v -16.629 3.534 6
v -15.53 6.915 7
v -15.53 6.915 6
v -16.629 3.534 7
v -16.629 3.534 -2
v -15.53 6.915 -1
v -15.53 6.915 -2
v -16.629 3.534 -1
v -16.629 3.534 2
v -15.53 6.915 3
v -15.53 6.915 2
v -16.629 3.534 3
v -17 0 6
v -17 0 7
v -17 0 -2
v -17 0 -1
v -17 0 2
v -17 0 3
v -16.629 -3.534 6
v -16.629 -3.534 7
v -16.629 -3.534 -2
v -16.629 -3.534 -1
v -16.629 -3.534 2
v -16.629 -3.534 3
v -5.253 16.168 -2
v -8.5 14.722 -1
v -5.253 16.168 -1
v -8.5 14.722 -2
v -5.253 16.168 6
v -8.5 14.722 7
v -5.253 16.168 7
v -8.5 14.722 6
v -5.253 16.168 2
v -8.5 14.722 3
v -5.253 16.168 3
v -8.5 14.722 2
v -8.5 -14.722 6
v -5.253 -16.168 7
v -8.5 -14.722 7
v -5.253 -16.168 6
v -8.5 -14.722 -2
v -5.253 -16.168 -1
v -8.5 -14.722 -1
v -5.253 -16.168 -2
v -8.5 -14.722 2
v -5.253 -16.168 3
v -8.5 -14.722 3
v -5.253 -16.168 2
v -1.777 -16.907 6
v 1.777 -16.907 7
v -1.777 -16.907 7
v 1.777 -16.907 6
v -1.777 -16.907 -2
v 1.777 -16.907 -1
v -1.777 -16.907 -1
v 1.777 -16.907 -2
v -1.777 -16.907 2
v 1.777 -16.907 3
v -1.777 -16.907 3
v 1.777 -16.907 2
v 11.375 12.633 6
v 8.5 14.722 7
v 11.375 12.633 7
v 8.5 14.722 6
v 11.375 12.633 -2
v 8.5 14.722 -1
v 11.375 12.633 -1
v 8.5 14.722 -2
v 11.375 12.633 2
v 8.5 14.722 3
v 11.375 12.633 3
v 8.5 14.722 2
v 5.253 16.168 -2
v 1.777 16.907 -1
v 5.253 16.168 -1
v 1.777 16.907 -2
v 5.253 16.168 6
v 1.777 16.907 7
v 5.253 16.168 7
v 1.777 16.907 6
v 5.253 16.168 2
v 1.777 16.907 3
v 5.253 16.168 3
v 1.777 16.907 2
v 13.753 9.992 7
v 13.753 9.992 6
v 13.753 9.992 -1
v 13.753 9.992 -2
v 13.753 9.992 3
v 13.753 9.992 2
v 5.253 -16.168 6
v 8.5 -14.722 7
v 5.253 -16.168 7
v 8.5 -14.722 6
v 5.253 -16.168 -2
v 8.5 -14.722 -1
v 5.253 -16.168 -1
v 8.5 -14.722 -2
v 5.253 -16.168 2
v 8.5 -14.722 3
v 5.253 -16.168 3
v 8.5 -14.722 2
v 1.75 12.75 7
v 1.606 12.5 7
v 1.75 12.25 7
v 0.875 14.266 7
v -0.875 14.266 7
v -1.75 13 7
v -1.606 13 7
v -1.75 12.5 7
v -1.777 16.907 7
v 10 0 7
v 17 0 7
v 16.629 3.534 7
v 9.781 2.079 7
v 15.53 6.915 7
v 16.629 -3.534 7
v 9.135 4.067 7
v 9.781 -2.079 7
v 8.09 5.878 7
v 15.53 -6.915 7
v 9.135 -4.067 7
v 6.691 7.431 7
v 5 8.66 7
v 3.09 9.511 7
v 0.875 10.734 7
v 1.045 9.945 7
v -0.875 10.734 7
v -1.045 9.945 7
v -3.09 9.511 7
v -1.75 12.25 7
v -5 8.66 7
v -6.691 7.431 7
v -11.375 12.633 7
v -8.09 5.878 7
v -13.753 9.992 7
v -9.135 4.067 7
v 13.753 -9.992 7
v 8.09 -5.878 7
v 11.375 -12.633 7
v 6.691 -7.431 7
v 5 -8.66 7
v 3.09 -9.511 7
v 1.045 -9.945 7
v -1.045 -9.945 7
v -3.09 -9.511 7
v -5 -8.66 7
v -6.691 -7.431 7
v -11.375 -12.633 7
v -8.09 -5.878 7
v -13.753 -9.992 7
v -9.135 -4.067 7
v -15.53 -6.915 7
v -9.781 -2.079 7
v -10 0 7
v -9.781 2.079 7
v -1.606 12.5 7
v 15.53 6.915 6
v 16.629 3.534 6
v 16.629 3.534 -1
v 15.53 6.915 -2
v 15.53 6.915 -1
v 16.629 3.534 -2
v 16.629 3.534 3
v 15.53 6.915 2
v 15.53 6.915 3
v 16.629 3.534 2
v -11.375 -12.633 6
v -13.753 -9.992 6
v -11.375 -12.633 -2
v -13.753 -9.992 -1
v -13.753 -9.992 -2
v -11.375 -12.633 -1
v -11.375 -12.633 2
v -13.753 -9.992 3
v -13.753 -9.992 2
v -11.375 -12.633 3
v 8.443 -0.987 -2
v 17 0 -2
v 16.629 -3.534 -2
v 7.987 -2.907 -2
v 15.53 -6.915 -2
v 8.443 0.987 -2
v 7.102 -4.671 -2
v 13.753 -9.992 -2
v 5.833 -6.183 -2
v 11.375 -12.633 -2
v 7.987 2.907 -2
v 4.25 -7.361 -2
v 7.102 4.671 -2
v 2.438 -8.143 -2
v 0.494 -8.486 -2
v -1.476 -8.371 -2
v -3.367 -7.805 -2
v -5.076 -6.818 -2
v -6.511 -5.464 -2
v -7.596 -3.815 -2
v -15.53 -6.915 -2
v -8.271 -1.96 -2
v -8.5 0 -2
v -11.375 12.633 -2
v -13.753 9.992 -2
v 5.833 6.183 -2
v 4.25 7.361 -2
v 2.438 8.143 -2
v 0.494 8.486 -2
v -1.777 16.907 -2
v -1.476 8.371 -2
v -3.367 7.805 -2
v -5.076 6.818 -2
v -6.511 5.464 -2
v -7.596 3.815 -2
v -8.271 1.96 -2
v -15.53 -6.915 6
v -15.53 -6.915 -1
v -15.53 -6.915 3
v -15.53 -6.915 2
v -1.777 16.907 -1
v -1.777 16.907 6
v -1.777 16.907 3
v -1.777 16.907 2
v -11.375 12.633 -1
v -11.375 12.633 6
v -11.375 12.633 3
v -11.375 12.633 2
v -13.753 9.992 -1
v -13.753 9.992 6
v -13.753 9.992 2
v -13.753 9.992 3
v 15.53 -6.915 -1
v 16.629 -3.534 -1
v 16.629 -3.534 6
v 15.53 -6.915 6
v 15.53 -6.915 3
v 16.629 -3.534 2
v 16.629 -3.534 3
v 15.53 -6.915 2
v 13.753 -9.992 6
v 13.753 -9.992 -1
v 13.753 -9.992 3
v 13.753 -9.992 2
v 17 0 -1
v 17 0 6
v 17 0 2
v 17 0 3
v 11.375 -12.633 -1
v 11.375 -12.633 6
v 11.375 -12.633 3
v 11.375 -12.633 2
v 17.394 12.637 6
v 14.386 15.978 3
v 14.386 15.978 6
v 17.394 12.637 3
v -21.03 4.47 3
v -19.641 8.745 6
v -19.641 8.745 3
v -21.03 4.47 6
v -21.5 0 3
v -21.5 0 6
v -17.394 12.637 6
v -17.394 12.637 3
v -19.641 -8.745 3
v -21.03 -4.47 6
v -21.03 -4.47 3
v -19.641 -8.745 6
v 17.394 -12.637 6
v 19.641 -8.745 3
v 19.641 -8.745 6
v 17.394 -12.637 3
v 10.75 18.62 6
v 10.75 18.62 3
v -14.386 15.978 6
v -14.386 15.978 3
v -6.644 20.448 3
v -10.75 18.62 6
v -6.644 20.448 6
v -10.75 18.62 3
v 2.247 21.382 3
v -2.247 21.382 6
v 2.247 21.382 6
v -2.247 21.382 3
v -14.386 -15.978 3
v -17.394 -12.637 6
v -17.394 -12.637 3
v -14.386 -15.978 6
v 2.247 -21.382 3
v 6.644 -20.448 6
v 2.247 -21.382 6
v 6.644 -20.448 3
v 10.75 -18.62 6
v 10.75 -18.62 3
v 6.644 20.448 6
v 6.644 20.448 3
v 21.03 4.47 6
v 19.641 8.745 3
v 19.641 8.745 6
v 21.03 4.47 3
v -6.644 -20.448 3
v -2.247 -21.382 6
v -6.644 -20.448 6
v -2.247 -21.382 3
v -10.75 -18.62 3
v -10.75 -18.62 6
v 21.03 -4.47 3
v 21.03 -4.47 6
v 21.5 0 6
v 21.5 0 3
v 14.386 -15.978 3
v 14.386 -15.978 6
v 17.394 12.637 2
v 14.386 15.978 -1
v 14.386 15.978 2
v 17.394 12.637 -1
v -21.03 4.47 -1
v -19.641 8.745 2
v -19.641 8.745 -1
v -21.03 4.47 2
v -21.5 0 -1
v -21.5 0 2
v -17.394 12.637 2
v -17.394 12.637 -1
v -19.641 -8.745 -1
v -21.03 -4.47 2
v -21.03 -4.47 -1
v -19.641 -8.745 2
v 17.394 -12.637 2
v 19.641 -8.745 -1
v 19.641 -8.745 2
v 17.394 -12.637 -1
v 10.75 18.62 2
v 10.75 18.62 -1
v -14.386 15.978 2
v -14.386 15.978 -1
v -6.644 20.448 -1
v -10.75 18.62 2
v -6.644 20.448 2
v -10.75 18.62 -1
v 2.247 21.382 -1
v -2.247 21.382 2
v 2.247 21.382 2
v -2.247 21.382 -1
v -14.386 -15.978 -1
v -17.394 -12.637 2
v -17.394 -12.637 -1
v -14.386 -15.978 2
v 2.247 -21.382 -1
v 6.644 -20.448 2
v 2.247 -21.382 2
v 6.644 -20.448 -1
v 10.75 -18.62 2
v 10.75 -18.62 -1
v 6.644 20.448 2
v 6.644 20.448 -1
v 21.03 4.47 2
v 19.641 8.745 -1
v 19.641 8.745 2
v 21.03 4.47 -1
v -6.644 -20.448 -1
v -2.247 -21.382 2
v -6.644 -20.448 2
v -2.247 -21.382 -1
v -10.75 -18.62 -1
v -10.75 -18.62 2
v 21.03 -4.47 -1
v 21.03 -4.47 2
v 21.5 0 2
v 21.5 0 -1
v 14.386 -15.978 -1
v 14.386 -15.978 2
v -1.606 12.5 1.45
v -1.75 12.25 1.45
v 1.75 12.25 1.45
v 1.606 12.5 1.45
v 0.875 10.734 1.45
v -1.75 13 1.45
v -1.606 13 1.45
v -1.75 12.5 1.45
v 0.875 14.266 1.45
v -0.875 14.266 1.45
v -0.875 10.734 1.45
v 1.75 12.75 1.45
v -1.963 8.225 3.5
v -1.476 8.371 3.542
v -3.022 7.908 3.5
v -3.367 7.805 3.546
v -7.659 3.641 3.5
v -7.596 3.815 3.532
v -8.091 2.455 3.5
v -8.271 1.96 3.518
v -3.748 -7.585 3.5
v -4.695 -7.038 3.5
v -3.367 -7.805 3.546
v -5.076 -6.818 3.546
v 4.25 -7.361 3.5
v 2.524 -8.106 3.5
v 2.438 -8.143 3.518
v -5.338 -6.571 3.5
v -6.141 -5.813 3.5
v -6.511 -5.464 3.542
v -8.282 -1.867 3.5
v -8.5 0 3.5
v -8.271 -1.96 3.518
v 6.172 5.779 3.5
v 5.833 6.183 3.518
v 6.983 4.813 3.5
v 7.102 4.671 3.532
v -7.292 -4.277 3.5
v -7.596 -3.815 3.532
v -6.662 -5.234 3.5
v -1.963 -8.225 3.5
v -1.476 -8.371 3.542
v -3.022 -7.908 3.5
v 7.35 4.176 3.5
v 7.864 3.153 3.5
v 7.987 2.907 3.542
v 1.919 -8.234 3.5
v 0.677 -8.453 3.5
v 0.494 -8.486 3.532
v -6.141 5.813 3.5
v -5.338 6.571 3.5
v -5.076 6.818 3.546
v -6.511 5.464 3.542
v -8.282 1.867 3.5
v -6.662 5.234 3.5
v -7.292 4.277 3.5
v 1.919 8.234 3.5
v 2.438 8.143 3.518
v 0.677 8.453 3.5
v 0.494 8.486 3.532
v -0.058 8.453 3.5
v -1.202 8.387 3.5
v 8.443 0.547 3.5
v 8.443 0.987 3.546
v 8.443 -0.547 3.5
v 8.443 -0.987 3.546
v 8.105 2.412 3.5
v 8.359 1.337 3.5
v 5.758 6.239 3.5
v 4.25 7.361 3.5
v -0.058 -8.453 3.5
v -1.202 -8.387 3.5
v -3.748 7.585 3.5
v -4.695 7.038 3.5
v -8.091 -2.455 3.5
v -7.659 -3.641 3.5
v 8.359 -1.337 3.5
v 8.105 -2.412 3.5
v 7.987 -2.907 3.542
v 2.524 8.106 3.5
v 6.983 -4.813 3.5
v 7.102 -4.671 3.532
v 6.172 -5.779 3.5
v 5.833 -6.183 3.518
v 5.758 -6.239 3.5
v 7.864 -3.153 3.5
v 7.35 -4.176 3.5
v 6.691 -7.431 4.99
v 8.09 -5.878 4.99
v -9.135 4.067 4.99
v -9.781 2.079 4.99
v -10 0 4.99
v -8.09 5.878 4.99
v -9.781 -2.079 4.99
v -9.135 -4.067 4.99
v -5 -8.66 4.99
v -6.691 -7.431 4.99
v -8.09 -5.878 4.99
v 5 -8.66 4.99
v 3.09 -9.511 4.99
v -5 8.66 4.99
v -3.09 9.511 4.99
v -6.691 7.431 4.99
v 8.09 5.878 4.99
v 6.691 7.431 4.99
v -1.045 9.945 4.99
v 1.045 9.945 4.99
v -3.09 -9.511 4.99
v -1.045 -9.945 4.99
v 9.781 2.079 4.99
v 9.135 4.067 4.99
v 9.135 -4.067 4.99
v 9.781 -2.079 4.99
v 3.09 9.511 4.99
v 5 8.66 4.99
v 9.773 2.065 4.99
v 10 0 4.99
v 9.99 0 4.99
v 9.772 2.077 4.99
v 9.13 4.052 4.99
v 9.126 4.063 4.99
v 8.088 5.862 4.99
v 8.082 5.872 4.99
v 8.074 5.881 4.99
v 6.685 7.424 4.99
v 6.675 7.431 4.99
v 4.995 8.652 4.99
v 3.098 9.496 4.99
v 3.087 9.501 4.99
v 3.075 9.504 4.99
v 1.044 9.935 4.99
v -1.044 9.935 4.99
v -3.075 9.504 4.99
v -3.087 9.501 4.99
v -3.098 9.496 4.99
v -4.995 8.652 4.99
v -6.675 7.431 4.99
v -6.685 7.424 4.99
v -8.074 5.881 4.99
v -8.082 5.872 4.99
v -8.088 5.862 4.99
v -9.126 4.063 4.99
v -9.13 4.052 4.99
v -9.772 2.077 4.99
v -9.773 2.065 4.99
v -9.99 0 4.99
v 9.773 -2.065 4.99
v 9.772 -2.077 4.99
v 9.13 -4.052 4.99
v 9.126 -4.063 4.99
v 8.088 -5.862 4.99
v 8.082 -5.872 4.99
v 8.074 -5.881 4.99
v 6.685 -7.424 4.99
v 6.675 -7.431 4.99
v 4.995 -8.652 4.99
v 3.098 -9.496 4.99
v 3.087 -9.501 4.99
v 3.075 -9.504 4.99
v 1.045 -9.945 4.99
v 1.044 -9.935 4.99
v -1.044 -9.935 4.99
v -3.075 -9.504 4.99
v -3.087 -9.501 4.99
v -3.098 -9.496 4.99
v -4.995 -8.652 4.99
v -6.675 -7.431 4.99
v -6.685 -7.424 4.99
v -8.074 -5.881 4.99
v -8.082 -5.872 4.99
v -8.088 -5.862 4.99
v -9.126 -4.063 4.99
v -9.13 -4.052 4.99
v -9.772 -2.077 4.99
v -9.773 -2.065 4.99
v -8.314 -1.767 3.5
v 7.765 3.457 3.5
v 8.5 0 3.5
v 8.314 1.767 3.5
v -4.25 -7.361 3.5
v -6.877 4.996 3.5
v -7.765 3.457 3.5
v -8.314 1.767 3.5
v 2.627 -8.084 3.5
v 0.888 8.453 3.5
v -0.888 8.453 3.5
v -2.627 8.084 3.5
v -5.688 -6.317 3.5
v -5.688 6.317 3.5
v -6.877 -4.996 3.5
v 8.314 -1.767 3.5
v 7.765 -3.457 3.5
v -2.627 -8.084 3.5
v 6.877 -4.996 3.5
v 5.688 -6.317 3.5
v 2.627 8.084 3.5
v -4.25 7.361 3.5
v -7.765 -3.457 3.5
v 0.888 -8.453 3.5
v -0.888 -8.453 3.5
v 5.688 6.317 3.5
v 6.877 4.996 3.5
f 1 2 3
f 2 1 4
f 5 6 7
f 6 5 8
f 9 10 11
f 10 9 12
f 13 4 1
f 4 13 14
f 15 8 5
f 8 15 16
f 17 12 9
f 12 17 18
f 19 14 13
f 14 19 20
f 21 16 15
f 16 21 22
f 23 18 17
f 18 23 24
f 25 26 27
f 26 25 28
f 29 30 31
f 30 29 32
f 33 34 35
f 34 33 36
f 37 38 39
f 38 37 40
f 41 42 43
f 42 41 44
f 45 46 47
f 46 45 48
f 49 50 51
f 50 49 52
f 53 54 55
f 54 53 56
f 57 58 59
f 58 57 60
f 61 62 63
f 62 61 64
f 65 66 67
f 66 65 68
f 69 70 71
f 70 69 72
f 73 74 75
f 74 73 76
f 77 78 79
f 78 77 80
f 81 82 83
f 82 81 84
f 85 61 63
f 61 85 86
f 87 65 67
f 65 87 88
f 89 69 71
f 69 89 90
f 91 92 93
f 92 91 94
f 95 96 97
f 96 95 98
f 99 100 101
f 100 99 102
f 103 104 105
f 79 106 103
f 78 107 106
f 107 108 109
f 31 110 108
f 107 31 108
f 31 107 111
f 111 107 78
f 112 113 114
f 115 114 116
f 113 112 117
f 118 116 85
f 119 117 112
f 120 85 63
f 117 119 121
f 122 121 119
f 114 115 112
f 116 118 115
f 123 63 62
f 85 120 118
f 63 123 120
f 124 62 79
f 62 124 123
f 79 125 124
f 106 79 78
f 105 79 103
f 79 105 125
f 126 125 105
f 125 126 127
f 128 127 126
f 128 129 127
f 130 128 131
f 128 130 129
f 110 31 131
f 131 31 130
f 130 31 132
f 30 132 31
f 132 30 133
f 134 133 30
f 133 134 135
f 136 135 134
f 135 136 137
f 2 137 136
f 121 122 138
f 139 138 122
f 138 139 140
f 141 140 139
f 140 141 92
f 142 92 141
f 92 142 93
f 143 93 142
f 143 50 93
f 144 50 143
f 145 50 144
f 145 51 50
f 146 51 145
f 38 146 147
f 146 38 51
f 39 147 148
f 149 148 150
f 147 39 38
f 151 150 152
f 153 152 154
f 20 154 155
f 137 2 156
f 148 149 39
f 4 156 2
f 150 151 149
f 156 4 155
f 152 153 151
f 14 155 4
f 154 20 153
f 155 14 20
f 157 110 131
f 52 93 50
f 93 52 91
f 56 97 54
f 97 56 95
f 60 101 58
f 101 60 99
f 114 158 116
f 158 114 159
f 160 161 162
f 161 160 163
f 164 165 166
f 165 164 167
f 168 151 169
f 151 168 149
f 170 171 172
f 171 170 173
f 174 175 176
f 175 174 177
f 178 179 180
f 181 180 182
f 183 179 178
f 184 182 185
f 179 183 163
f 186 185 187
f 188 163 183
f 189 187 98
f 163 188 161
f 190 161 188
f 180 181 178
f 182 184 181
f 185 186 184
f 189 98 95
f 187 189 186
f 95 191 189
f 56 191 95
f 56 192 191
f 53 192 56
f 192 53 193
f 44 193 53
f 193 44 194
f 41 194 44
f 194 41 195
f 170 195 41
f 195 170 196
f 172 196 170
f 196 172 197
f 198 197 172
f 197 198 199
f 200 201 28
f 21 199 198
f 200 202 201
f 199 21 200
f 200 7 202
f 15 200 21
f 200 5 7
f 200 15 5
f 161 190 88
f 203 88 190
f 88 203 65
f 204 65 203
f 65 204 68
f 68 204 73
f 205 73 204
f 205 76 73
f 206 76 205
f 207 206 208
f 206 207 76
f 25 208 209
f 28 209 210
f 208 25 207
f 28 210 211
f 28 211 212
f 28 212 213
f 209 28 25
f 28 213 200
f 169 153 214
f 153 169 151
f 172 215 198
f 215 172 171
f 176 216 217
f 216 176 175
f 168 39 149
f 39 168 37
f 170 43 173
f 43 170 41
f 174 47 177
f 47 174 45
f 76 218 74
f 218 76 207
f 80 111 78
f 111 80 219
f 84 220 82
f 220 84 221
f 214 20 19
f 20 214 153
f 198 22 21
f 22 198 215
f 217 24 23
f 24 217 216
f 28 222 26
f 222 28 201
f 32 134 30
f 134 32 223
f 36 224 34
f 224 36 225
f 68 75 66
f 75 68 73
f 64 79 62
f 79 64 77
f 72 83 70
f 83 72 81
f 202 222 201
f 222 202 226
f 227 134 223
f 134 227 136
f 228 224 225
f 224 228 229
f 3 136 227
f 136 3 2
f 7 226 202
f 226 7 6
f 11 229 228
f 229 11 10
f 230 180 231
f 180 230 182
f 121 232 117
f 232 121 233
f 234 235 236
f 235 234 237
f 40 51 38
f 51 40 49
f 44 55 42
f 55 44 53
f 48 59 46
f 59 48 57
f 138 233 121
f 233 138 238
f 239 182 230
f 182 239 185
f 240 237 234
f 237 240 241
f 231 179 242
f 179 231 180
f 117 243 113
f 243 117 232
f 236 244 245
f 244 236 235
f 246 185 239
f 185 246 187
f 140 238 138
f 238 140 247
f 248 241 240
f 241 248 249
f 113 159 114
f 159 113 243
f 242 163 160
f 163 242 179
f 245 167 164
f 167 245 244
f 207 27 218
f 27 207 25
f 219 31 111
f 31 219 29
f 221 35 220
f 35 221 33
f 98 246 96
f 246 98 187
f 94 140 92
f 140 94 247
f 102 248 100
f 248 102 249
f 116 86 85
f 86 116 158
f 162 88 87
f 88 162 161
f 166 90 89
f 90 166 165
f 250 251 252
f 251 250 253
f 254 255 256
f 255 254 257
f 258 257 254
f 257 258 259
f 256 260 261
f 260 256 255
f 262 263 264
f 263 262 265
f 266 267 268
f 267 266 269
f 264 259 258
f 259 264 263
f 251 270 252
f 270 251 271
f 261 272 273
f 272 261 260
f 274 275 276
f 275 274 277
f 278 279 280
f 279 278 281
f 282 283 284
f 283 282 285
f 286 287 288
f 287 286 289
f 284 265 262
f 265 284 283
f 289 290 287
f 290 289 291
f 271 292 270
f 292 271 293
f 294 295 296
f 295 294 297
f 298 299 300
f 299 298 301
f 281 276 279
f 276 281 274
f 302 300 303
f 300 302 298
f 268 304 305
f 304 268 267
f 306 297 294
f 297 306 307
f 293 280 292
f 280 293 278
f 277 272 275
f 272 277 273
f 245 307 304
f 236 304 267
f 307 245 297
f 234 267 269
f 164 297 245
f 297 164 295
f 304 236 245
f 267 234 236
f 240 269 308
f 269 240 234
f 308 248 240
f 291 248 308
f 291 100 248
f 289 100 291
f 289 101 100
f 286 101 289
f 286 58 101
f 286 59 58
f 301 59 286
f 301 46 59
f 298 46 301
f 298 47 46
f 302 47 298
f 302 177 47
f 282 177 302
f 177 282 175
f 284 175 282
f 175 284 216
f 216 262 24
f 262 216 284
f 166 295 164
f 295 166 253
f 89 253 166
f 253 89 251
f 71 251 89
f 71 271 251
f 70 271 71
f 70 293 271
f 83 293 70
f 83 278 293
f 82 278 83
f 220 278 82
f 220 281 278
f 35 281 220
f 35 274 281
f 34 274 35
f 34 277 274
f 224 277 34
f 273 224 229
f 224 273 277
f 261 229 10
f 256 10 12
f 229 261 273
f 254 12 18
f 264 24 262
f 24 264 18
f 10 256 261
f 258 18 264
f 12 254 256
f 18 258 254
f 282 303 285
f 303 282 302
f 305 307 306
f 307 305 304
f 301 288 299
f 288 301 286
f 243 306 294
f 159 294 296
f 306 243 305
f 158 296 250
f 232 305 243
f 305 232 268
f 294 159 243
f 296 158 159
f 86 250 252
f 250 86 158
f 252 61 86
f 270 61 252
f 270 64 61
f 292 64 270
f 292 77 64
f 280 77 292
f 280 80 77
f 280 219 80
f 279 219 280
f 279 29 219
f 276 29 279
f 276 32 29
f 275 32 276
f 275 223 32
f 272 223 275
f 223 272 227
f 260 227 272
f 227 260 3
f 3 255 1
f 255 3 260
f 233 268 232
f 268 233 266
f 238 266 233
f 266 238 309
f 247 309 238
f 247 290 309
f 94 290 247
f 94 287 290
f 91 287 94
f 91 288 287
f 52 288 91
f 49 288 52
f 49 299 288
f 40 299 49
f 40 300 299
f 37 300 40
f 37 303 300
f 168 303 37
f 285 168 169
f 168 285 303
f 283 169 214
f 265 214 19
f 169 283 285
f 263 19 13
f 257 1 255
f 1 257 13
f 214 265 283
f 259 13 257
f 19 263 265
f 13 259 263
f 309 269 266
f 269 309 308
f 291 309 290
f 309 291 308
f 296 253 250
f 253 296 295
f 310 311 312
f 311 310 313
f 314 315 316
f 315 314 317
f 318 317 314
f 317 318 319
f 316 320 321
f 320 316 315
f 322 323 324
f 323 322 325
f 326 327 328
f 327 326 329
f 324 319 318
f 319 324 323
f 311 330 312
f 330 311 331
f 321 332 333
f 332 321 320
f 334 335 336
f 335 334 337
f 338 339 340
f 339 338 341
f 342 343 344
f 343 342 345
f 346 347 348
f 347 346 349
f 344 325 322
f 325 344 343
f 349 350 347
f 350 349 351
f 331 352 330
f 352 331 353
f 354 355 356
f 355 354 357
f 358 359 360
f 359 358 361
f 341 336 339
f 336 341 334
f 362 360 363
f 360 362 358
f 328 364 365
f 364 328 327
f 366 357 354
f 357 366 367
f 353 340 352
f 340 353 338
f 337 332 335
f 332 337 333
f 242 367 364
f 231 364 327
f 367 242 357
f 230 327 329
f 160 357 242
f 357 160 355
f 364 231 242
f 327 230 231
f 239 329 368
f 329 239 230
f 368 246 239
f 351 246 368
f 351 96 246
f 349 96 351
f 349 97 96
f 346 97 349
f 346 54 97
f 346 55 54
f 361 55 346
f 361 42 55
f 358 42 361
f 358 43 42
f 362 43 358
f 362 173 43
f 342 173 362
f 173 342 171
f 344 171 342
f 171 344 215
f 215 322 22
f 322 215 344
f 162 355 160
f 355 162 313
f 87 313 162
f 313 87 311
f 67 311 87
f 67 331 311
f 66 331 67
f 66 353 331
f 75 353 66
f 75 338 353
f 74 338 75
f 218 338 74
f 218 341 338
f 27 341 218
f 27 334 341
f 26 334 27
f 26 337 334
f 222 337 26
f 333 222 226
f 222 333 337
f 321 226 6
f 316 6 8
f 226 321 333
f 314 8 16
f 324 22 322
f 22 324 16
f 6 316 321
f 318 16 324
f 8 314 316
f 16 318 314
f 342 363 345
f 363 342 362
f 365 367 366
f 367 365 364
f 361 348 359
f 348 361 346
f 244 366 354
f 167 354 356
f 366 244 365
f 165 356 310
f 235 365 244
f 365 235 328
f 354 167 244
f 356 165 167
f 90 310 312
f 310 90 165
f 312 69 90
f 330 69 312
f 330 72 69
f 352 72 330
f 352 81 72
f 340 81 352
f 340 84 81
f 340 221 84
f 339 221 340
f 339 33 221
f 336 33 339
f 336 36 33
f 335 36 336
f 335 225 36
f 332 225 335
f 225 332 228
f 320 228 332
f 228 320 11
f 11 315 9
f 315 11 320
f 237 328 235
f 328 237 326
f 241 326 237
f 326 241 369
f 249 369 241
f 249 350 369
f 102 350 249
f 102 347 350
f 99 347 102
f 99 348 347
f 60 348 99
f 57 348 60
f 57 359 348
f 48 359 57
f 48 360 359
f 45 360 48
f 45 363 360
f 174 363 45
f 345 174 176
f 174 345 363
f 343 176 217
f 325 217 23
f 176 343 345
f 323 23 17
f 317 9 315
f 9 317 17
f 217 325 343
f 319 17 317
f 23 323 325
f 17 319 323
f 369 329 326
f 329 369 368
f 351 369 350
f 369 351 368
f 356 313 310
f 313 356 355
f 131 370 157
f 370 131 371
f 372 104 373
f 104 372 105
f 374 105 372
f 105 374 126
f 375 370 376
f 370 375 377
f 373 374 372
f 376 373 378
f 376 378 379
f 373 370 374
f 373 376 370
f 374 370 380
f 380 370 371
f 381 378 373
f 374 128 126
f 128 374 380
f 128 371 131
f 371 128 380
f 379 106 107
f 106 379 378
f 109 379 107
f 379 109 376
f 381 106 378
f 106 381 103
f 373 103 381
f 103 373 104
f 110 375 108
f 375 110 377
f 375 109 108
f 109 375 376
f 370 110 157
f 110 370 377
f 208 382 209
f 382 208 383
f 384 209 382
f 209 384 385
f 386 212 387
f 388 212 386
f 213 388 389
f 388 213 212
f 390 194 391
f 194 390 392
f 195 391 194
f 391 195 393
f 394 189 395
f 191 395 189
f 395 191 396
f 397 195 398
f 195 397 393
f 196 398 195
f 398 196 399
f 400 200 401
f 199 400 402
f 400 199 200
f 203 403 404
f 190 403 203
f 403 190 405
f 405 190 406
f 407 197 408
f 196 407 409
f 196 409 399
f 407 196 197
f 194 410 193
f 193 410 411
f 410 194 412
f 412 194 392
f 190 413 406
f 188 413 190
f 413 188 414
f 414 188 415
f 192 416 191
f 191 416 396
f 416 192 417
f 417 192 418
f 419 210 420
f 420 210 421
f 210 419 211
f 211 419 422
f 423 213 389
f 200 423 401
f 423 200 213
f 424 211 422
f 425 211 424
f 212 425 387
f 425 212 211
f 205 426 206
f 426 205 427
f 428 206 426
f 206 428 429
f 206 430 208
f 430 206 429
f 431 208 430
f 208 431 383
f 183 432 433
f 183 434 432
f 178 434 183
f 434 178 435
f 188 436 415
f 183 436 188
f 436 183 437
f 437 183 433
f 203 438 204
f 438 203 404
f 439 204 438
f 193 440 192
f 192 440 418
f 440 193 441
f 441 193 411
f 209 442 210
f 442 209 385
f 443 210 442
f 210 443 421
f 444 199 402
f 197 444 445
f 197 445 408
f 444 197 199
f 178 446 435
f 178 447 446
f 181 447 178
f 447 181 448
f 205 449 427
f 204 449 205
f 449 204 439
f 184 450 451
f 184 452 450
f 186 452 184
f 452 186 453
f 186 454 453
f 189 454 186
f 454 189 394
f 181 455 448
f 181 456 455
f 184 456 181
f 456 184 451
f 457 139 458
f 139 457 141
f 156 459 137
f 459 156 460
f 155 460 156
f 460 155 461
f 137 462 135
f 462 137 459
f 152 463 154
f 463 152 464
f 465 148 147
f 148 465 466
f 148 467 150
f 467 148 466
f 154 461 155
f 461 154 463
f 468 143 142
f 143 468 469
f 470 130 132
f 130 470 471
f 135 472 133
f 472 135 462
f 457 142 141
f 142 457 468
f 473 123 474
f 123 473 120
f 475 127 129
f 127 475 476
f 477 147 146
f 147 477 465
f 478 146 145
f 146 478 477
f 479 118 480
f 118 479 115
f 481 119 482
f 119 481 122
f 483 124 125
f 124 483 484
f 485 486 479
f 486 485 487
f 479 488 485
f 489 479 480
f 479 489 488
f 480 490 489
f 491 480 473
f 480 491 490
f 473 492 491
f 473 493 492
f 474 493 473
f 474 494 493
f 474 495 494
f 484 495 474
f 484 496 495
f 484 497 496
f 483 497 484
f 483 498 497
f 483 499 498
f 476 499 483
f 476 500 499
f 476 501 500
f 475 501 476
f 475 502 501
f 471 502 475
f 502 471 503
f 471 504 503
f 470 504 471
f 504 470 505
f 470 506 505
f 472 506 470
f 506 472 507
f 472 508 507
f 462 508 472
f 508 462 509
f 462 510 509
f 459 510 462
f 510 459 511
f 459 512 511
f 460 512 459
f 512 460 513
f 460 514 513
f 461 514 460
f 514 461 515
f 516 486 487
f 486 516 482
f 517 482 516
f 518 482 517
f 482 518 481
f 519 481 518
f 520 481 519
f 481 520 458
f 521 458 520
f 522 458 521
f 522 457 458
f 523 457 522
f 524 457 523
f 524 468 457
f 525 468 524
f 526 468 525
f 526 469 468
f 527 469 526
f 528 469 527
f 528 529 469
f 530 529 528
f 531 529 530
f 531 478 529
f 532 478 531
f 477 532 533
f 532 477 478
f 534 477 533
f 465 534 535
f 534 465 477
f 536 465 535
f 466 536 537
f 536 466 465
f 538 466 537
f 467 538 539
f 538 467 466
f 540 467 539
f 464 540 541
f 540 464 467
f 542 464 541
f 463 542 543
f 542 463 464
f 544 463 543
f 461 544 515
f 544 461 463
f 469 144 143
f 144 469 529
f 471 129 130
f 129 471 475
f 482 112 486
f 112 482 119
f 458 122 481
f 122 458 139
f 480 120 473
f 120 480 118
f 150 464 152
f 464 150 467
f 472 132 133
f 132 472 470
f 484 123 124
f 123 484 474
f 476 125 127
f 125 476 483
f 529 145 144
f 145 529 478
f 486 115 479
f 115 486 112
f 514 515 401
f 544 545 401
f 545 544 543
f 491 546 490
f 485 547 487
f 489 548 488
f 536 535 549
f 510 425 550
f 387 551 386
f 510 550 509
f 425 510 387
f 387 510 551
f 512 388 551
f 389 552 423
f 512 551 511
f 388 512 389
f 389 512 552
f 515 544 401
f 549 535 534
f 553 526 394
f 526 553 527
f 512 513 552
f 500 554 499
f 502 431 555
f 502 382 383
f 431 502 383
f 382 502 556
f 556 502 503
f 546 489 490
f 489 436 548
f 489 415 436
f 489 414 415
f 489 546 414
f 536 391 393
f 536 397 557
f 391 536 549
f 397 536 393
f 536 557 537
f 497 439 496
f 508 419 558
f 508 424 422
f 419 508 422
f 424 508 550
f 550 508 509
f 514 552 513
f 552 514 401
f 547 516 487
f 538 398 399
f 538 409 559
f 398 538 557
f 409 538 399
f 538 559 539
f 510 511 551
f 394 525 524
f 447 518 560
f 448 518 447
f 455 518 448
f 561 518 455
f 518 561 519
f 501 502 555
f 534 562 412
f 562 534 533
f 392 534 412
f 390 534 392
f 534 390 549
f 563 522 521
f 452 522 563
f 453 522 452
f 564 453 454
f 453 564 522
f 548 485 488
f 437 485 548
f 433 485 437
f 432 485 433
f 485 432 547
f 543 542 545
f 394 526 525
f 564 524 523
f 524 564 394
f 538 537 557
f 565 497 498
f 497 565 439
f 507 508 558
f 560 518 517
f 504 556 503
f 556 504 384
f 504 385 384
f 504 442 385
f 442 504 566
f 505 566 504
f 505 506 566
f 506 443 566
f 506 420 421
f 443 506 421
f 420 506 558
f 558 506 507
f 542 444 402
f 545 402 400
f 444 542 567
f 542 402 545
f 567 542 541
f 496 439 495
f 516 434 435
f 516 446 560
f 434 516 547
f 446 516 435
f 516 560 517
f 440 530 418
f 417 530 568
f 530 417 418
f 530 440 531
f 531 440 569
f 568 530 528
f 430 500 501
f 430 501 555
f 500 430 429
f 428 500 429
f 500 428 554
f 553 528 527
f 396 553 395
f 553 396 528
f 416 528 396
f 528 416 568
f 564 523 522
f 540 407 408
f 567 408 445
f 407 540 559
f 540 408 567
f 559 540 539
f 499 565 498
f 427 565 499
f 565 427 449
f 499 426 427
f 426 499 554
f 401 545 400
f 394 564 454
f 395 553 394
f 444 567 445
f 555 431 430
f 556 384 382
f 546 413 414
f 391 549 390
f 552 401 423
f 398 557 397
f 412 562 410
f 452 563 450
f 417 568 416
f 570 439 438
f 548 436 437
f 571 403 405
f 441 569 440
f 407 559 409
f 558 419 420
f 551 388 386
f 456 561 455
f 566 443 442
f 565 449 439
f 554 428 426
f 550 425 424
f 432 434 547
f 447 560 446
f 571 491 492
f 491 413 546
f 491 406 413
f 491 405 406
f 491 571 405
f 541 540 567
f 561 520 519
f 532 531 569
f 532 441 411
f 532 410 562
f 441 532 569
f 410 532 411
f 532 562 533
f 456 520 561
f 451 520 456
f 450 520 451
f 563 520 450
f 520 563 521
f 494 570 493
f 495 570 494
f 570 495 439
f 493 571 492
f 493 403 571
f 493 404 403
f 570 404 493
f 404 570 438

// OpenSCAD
// Rotate the disc by 180 degrees to flip it upside down, which
// makes it easier to print the hole, etc. Lift it up by 7mm to bring
// it back above the axis // (the entire body is 7mm high).
translate([0, 0, 7]) rotate(a=[0,180,0]) difference() {
	union() {
		// Big cylinder for placement inside the machine.
		cylinder(h = 9, r = 17);

		// Lower cylinder; any left/right information would go here.
		translate([0, 0, 1]) cylinder(h = 3, r = 21.5);

		// Upper cylinder; contains forward/backward and speed.
		translate([0, 0, 5]) cylinder(h = 3, r = 21.5);
	}

	// Subtract the inner hole. Be very generous.
	translate([0, 0, 4])
		cylinder(h = 10, r = 8.5, center=true);

	// Subtract the lower cone.
	cylinder(h = 2.01, r = 10);

	// Subtract the diagonal layer the disk rests on.
	translate([0, 0, 2])
		cylinder(h = 1.5, r1 = 10, r2 = 8.5);

	// Transport hole
	union() {
		translate([0, 12.25, -0.05])
			cylinder(h = 5.6, r=1.75);
		translate([0, 12.75, -0.05])
			cylinder(h = 5.6, r=1.75);
		translate([0, 12.5, -0.05])
			cube(size = [1.75, 0.5, 5.6]);
	}
}
